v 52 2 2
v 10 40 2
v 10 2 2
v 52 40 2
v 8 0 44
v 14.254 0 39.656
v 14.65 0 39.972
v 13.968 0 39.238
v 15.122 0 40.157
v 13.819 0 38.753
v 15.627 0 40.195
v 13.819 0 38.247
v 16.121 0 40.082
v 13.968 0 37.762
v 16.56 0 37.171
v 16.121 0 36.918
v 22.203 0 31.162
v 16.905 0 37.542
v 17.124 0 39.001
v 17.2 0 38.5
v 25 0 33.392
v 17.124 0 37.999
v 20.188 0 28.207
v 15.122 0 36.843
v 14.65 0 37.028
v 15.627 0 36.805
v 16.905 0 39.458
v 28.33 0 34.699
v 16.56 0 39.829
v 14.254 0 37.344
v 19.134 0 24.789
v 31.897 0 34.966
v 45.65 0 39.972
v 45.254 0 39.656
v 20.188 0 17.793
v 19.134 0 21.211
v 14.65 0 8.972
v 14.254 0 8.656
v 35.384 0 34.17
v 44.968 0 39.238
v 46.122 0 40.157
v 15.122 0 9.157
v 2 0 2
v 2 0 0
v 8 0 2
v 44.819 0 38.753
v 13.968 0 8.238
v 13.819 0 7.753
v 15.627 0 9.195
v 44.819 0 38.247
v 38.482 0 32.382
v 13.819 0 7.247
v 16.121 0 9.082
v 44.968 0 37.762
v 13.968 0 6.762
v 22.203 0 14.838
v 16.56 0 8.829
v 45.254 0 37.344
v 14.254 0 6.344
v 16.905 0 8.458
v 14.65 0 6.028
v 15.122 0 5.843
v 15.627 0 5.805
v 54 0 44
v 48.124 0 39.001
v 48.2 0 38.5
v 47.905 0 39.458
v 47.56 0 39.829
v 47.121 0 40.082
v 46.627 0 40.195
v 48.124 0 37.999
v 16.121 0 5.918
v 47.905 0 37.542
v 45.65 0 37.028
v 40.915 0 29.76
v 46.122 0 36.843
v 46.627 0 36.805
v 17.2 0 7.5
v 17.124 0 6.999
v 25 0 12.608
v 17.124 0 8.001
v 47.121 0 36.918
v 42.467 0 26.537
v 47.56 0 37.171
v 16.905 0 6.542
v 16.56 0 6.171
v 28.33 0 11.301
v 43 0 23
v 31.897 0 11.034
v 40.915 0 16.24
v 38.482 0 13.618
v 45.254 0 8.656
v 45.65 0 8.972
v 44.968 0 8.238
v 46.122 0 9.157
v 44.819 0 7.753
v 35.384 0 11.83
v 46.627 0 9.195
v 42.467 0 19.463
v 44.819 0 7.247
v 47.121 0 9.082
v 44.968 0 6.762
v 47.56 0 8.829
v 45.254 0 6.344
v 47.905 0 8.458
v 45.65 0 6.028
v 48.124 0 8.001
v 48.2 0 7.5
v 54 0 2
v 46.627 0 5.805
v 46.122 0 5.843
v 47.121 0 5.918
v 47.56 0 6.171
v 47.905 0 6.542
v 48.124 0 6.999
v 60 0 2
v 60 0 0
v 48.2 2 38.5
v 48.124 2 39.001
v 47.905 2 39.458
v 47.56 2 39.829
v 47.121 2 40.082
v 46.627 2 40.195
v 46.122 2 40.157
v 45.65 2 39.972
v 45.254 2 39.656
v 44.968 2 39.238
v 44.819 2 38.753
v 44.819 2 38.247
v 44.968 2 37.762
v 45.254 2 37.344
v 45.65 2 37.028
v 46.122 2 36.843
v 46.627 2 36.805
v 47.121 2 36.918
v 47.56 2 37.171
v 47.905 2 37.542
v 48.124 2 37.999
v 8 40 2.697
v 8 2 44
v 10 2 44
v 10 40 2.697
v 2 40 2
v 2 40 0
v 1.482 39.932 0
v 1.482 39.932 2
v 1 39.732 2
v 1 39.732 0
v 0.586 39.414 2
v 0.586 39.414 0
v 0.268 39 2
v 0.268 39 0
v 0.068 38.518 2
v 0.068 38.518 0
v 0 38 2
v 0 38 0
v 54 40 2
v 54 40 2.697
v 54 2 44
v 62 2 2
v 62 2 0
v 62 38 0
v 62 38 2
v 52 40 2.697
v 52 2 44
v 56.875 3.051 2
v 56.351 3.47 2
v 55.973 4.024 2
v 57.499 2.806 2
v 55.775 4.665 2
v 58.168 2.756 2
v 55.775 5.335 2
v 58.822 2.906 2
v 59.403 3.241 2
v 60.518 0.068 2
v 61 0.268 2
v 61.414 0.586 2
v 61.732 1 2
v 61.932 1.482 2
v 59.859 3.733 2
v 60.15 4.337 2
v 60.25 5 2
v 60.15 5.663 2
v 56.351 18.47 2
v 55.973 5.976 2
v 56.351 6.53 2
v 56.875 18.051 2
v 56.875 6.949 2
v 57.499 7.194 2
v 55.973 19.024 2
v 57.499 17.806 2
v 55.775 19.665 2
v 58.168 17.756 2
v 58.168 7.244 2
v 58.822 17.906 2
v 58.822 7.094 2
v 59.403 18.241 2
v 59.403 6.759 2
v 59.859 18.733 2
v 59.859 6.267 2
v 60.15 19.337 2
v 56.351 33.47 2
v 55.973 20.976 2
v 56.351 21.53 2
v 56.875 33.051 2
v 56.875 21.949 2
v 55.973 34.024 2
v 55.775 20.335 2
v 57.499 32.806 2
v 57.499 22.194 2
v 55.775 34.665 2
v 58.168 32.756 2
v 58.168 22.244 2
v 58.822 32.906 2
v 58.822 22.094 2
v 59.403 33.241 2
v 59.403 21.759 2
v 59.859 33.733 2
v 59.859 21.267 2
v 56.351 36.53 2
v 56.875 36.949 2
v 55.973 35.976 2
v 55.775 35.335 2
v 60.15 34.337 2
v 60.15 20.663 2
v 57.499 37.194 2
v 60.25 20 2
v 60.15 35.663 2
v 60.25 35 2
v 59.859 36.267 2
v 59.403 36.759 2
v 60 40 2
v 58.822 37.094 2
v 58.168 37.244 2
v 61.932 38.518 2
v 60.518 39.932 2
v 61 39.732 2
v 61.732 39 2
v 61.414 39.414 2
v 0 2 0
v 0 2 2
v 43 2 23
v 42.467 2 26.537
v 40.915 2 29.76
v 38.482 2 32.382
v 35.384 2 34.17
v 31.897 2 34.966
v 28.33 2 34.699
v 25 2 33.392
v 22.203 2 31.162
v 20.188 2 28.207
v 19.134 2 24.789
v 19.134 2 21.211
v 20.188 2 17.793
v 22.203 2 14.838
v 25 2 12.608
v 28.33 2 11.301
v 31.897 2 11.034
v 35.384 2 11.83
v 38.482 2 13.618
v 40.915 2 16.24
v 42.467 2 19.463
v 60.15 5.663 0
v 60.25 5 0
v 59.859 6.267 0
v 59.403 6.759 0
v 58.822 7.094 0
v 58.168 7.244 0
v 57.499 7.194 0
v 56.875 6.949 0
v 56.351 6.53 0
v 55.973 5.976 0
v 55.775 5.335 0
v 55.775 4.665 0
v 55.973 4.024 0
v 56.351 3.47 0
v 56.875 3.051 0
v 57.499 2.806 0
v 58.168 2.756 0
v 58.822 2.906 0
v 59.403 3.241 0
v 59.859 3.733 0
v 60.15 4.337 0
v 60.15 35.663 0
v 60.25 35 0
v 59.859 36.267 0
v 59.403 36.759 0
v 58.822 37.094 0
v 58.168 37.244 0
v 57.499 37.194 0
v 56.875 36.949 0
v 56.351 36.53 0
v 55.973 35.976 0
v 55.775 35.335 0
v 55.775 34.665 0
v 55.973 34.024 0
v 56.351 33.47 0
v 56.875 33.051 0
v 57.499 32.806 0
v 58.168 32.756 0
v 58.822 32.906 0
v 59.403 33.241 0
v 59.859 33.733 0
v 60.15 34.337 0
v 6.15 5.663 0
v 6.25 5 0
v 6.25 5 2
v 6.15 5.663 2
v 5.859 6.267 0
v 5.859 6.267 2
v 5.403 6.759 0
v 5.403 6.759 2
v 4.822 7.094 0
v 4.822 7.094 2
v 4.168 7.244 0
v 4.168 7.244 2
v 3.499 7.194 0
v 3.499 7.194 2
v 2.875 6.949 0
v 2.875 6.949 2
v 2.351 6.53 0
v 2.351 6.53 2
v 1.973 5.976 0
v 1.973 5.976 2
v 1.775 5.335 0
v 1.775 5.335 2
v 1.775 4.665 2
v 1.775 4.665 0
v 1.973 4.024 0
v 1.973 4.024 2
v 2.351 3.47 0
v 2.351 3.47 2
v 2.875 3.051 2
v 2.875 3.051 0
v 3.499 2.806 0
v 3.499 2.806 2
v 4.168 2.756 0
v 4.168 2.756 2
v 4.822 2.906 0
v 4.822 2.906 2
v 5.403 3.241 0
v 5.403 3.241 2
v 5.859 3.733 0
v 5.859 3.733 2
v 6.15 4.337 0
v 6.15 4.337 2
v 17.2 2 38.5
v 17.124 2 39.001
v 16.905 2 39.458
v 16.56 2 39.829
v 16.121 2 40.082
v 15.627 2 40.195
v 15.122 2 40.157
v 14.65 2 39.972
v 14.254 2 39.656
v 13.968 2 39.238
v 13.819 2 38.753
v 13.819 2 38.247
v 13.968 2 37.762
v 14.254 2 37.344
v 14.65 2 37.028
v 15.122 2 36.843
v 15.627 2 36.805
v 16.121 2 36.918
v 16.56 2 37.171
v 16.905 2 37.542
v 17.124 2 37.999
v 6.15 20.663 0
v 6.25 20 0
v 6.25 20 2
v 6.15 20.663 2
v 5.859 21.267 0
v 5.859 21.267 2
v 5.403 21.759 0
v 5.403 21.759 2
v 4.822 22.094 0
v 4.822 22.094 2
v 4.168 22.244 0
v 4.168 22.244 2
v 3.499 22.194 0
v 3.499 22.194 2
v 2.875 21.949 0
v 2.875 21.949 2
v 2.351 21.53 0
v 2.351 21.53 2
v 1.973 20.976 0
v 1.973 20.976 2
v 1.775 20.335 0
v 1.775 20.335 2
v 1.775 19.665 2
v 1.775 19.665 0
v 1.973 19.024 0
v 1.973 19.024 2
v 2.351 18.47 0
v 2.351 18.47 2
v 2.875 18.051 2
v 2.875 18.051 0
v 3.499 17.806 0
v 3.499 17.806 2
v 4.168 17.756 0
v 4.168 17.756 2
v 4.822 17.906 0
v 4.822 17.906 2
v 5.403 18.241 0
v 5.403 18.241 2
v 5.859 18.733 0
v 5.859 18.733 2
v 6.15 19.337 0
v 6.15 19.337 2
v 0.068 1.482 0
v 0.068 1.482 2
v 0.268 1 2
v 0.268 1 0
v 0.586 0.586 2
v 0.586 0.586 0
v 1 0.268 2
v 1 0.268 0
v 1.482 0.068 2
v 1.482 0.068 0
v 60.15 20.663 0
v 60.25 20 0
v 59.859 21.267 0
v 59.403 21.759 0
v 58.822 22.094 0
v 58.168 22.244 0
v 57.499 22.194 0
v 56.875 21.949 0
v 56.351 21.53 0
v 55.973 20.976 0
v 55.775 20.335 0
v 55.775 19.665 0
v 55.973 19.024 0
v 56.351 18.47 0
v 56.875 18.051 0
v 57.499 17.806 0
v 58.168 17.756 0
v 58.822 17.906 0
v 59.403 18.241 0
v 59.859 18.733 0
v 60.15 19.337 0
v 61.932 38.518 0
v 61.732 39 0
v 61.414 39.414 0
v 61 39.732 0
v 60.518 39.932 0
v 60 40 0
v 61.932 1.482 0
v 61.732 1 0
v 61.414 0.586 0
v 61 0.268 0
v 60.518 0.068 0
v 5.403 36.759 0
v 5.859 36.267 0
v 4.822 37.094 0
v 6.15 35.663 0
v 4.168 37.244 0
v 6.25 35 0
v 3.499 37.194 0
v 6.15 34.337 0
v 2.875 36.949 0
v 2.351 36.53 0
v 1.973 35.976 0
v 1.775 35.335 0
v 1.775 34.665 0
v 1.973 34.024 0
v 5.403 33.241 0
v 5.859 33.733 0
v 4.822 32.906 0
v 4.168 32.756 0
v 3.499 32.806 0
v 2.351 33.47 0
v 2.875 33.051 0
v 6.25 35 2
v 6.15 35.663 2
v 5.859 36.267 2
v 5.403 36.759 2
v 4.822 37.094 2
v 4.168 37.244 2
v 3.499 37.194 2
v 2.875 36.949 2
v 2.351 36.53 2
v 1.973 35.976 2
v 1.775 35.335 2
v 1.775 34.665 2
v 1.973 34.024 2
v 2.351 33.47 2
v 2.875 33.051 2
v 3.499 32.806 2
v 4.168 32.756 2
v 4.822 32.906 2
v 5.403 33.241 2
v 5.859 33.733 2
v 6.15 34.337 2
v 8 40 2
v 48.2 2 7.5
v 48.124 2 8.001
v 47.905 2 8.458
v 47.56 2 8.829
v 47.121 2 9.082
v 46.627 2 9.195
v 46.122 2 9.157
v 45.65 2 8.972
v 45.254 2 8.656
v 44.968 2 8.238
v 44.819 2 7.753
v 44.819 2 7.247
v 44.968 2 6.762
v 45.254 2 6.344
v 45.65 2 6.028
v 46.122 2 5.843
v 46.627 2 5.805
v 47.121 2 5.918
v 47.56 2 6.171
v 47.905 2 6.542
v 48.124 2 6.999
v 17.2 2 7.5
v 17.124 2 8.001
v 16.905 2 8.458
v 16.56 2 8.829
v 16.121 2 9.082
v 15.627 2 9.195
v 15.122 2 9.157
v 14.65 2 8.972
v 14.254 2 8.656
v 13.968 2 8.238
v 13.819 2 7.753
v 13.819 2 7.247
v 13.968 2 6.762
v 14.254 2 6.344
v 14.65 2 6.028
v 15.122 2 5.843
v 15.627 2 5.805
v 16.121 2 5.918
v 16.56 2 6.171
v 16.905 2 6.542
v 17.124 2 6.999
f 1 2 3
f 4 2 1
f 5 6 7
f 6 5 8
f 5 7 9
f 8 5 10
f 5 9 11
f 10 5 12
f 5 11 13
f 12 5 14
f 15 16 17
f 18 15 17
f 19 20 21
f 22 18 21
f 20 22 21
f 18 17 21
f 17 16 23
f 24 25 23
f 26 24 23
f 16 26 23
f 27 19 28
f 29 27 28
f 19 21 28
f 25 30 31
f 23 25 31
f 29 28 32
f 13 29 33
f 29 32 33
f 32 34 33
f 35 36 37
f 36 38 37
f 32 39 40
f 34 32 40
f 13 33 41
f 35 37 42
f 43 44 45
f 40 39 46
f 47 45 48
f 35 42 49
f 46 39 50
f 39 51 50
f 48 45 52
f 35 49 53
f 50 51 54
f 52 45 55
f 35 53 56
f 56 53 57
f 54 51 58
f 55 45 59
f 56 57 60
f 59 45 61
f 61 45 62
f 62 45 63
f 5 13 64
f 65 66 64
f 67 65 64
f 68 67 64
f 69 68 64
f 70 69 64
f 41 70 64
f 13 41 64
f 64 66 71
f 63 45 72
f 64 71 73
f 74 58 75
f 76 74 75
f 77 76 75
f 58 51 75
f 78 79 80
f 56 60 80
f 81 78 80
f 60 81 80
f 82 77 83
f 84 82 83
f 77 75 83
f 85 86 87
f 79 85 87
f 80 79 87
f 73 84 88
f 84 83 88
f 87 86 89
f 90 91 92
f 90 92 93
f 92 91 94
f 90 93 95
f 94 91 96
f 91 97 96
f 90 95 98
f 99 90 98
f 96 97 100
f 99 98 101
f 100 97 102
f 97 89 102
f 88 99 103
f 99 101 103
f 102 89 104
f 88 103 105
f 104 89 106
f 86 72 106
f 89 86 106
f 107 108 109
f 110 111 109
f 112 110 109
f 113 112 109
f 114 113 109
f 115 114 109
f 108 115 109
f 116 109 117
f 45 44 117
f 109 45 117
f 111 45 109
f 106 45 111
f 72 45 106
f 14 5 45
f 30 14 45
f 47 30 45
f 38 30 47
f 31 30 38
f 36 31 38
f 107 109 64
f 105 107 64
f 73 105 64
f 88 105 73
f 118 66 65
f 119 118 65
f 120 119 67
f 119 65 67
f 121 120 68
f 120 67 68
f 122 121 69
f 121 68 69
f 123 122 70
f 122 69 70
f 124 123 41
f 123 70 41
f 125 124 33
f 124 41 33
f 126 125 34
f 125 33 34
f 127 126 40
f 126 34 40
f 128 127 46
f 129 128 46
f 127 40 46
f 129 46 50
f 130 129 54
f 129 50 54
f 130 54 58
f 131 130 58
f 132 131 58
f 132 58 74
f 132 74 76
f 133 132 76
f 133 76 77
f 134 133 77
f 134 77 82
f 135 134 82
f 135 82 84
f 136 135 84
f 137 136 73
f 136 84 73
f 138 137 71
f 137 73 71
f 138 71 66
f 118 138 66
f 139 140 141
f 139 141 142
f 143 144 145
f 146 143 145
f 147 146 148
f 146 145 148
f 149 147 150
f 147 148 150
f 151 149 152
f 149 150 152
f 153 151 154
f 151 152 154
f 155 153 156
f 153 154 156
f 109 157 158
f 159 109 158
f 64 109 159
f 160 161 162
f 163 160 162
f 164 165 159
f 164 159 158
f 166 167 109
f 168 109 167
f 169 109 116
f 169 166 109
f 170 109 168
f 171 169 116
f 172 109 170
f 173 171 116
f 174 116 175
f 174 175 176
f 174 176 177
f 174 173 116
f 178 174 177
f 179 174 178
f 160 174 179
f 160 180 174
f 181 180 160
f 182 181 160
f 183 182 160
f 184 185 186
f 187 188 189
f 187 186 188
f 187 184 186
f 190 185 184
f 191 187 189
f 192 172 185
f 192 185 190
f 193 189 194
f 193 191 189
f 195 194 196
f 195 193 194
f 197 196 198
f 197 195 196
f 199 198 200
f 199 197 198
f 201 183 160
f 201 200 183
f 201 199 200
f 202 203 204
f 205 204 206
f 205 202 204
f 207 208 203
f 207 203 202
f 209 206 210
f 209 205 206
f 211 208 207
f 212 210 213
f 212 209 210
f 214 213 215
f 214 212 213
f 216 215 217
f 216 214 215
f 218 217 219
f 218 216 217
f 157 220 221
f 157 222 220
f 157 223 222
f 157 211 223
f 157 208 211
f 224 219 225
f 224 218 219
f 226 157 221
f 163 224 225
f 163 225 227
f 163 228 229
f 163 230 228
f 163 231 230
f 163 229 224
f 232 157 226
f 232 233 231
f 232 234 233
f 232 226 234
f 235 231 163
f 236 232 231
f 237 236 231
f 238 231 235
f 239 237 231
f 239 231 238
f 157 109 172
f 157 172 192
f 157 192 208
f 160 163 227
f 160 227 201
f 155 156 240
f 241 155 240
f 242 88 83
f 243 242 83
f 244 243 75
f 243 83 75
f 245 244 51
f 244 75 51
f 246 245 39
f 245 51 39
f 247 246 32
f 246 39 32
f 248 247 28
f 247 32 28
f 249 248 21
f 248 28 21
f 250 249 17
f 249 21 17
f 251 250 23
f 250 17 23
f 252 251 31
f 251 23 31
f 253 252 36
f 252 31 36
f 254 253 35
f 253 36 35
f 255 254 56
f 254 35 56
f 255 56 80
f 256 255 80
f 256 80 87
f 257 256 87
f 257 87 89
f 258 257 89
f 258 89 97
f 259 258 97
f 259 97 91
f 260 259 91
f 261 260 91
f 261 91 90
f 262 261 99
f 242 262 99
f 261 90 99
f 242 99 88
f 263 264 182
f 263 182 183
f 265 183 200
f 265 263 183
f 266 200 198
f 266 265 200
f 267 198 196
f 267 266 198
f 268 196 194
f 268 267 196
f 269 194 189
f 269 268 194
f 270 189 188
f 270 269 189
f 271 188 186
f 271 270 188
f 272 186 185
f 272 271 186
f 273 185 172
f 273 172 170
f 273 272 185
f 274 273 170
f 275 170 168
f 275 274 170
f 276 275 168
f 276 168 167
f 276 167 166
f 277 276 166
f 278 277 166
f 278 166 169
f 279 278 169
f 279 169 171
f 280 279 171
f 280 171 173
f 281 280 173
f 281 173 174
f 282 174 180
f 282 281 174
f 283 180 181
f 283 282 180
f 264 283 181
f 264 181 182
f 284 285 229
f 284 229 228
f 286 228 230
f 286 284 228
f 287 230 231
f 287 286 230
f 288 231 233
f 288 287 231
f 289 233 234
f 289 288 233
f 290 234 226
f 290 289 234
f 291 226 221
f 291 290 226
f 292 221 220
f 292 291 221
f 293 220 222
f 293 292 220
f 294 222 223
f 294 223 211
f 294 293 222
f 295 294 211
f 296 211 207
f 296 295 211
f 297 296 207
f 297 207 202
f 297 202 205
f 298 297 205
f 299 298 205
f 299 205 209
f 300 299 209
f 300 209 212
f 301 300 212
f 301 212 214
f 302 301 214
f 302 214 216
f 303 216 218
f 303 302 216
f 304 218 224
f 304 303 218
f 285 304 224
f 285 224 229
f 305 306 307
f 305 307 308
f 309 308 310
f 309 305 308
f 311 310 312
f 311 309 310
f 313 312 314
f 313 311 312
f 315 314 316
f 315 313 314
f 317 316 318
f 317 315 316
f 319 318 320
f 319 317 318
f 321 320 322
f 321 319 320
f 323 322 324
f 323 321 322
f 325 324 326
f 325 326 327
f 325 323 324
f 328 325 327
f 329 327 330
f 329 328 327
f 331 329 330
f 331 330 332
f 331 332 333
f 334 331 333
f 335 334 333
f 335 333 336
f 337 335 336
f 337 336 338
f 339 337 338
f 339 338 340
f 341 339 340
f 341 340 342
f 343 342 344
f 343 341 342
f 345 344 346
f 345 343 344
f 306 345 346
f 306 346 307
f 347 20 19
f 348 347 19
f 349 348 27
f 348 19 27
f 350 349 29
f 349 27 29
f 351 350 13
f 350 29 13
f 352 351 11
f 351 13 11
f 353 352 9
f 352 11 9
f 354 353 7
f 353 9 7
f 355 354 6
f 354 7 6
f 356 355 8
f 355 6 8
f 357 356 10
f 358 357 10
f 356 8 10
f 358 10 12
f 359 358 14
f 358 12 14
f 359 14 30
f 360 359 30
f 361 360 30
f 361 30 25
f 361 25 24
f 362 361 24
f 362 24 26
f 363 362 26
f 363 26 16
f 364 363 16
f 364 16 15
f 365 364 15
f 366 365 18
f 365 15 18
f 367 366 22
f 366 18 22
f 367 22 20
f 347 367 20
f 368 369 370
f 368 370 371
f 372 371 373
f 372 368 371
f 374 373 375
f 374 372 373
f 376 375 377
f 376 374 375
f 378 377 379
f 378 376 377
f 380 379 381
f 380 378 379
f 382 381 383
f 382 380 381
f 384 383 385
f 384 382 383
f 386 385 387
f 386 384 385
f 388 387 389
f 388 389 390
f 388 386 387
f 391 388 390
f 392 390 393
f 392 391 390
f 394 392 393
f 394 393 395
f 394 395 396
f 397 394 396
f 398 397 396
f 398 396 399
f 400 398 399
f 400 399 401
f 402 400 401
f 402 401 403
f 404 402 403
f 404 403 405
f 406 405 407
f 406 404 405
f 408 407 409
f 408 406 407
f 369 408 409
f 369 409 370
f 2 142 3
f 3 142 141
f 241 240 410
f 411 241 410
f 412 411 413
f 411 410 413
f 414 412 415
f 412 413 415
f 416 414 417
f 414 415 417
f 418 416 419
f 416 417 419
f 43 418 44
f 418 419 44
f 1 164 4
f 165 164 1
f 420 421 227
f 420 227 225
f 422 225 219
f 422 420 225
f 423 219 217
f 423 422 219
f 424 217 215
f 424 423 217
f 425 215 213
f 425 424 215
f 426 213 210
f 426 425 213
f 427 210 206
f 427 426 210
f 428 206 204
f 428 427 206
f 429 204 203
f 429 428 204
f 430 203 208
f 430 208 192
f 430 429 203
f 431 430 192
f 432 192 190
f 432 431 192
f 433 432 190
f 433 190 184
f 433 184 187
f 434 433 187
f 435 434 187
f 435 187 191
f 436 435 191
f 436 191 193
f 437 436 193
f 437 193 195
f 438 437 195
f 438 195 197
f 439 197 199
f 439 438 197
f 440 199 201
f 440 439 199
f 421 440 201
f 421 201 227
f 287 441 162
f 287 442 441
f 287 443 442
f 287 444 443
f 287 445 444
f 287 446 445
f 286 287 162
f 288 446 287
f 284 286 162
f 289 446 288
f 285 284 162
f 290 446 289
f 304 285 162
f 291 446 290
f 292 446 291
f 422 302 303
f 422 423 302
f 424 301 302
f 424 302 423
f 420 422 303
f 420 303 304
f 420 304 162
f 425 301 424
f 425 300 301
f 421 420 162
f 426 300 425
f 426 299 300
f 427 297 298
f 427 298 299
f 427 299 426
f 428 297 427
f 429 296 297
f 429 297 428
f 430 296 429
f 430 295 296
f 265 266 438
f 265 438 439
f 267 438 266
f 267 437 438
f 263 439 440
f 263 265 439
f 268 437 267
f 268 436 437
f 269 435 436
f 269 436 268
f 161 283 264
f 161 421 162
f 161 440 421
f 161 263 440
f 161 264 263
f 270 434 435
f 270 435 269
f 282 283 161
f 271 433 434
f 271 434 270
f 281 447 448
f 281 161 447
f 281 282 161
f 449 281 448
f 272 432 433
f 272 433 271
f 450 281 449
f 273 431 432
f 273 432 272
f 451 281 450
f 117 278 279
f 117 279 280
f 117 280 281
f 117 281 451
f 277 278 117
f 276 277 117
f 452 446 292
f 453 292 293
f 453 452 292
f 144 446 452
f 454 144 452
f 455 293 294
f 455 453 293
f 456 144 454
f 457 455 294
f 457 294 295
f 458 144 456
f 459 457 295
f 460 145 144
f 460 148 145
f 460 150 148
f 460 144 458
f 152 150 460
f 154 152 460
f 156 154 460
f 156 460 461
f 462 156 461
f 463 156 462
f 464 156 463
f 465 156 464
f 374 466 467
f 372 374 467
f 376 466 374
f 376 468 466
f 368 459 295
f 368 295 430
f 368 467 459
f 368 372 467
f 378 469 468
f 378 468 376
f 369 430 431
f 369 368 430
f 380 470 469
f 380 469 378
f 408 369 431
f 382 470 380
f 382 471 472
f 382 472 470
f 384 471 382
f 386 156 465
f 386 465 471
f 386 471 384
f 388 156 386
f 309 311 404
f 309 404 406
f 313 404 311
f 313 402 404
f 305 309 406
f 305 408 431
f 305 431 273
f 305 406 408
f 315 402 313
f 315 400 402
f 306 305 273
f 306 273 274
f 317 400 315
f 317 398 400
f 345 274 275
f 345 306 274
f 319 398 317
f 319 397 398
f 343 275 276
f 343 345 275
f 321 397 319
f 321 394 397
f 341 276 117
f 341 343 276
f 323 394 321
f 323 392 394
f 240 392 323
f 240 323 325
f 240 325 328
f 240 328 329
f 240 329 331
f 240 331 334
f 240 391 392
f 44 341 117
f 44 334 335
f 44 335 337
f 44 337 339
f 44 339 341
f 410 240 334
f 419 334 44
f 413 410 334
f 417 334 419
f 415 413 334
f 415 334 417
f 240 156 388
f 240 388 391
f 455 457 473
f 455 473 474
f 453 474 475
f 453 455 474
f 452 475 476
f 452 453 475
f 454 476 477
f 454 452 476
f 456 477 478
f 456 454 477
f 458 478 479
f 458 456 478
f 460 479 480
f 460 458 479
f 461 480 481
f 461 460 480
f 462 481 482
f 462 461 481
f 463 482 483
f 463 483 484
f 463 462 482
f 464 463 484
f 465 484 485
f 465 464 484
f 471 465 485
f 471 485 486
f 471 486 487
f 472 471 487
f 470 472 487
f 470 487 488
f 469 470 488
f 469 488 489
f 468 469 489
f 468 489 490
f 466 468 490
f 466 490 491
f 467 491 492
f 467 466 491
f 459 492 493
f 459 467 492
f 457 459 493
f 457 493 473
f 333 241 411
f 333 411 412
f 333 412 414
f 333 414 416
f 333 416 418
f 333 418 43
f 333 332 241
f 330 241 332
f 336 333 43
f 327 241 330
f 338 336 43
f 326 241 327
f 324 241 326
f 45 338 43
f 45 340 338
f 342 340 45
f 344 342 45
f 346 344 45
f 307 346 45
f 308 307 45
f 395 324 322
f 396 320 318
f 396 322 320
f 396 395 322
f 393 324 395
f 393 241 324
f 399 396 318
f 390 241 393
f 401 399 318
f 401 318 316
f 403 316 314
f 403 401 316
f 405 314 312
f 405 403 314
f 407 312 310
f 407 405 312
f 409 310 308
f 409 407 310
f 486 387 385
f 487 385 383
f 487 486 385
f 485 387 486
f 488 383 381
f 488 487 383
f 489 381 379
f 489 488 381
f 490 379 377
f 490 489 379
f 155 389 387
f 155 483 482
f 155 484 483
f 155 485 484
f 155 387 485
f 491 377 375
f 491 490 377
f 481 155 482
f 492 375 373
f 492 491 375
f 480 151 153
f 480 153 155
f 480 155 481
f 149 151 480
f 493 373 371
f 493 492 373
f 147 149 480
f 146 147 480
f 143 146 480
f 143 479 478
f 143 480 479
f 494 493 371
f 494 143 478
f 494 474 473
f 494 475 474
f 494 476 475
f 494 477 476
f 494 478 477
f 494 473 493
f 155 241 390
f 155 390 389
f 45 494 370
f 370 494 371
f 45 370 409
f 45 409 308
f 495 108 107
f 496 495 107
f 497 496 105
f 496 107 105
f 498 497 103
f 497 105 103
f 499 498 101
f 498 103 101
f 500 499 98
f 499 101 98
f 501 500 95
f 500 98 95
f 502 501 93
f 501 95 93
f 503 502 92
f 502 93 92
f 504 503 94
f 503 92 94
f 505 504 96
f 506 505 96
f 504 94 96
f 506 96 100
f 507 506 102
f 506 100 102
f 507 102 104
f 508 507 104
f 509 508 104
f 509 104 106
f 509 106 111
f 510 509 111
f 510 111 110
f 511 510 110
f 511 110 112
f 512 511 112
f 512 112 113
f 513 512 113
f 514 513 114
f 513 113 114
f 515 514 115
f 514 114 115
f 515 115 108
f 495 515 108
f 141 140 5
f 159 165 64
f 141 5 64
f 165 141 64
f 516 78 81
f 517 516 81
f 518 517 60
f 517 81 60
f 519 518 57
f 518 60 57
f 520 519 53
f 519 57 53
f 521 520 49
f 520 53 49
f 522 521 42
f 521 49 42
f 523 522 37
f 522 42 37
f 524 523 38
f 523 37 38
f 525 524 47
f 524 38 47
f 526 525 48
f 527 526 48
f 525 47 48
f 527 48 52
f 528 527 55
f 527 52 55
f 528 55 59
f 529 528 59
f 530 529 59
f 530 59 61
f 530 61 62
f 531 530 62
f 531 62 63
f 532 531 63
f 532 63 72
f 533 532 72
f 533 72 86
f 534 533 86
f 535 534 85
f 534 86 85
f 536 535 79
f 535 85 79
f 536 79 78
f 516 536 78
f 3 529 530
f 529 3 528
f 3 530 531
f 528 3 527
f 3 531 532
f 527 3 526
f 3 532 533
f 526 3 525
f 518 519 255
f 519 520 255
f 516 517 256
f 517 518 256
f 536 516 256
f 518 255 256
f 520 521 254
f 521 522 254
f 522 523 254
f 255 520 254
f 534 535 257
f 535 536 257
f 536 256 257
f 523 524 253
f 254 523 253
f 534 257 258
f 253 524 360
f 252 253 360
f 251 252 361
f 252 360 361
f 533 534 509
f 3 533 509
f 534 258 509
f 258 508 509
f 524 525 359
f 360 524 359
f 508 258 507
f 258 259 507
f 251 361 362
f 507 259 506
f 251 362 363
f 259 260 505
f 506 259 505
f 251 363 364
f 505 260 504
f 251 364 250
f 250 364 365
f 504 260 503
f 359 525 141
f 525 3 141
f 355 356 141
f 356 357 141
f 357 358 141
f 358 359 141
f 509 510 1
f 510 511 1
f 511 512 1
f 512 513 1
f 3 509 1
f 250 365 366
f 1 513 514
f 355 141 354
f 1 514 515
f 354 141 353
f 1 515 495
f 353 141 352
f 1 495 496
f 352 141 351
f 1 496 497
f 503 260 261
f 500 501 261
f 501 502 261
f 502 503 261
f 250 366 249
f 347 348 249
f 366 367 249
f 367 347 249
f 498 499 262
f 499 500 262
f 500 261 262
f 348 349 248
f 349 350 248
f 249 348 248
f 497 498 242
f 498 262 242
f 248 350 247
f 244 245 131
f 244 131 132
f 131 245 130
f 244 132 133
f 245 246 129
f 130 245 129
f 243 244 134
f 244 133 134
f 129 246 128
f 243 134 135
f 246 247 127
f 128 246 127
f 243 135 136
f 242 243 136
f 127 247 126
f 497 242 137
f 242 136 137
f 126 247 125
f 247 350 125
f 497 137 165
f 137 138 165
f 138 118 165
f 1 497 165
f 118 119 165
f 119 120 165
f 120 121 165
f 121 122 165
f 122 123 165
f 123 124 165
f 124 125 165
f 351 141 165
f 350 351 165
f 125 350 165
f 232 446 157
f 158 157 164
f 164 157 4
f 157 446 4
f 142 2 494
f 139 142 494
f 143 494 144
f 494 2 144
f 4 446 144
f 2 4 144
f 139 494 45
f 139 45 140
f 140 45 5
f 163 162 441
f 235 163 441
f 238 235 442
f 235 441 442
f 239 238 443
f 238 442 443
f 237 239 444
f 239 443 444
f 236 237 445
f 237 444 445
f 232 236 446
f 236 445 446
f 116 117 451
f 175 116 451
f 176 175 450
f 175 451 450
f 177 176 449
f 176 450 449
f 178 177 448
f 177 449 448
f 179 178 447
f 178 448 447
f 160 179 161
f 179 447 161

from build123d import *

# Parameters (mm, degrees)
F0_R     = 2.25
F1_DEPTH = 2
F2_W     = 46
F2_H     = 44
F2_R     = 1.7
F2_R_2   = 12
F3_DEPTH = 2
F5_DEPTH = 2
F6_START = -44
F6_DEPTH = 2


with BuildPart() as f1:
    # F0 (on Top) → F1 (new body)
    with BuildSketch(Plane.XY):
        with BuildLine():
            ThreePointArc((0, 2), (0.5857864376, 0.5857864376), (2, 0))
            Line((2, 0), (60, 0))
            ThreePointArc((60, 0), (61.4142135624, 0.5857864376), (62, 2))
            Line((62, 2), (62, 38))
            ThreePointArc((62, 38), (61.4142135624, 39.4142135624), (60, 40))
            Line((60, 40), (2, 40))
            ThreePointArc((2, 40), (0.5857864376, 39.4142135624), (0, 38))
            Line((0, 38), (0, 2))
        make_face()
        with Locations((4, 5)):
            Circle(F0_R, mode=Mode.SUBTRACT)
        with Locations((58, 5)):
            Circle(F0_R, mode=Mode.SUBTRACT)
        with Locations((4, 20)):
            Circle(F0_R, mode=Mode.SUBTRACT)
        with Locations((4, 35)):
            Circle(F0_R, mode=Mode.SUBTRACT)
        with Locations((58, 20)):
            Circle(F0_R, mode=Mode.SUBTRACT)
        with Locations((58, 35)):
            Circle(F0_R, mode=Mode.SUBTRACT)
    extrude(amount=F1_DEPTH)

    # F2 (on Front) → F3 (join)
    with BuildSketch(Plane.XZ):
        with Locations((31, 22)):
            Rectangle(F2_W, F2_H)
        with Locations((15.5, 7.5)):
            Circle(F2_R, mode=Mode.SUBTRACT)
        with Locations((46.5, 7.5)):
            Circle(F2_R, mode=Mode.SUBTRACT)
        with Locations((15.5, 38.5)):
            Circle(F2_R, mode=Mode.SUBTRACT)
        with Locations((31, 23)):
            Circle(F2_R_2, mode=Mode.SUBTRACT)
        with Locations((46.5, 38.5)):
            Circle(F2_R, mode=Mode.SUBTRACT)
    extrude(amount=-F3_DEPTH)

    # F4 (on face) → F5 (join)
    with BuildSketch(Plane(origin=(8, 0, 0), x_dir=(0, -1, 0), z_dir=(-1, 0, 0))):
        Polygon((0, 44), (-2, 44), (-40, 2.6966344009), (-40, 0), (0, 0), align=None)
    extrude(amount=-F5_DEPTH)

    # F4 (on face) → F6 (join)
    with BuildSketch(Plane(origin=(8, 0, 0), x_dir=(0, -1, 0), z_dir=(-1, 0, 0)).offset(F6_START)):
        Polygon((0, 44), (-2, 44), (-40, 2.6966344009), (-40, 0), (0, 0), align=None)
    extrude(amount=-F6_DEPTH)


solid = f1.part
